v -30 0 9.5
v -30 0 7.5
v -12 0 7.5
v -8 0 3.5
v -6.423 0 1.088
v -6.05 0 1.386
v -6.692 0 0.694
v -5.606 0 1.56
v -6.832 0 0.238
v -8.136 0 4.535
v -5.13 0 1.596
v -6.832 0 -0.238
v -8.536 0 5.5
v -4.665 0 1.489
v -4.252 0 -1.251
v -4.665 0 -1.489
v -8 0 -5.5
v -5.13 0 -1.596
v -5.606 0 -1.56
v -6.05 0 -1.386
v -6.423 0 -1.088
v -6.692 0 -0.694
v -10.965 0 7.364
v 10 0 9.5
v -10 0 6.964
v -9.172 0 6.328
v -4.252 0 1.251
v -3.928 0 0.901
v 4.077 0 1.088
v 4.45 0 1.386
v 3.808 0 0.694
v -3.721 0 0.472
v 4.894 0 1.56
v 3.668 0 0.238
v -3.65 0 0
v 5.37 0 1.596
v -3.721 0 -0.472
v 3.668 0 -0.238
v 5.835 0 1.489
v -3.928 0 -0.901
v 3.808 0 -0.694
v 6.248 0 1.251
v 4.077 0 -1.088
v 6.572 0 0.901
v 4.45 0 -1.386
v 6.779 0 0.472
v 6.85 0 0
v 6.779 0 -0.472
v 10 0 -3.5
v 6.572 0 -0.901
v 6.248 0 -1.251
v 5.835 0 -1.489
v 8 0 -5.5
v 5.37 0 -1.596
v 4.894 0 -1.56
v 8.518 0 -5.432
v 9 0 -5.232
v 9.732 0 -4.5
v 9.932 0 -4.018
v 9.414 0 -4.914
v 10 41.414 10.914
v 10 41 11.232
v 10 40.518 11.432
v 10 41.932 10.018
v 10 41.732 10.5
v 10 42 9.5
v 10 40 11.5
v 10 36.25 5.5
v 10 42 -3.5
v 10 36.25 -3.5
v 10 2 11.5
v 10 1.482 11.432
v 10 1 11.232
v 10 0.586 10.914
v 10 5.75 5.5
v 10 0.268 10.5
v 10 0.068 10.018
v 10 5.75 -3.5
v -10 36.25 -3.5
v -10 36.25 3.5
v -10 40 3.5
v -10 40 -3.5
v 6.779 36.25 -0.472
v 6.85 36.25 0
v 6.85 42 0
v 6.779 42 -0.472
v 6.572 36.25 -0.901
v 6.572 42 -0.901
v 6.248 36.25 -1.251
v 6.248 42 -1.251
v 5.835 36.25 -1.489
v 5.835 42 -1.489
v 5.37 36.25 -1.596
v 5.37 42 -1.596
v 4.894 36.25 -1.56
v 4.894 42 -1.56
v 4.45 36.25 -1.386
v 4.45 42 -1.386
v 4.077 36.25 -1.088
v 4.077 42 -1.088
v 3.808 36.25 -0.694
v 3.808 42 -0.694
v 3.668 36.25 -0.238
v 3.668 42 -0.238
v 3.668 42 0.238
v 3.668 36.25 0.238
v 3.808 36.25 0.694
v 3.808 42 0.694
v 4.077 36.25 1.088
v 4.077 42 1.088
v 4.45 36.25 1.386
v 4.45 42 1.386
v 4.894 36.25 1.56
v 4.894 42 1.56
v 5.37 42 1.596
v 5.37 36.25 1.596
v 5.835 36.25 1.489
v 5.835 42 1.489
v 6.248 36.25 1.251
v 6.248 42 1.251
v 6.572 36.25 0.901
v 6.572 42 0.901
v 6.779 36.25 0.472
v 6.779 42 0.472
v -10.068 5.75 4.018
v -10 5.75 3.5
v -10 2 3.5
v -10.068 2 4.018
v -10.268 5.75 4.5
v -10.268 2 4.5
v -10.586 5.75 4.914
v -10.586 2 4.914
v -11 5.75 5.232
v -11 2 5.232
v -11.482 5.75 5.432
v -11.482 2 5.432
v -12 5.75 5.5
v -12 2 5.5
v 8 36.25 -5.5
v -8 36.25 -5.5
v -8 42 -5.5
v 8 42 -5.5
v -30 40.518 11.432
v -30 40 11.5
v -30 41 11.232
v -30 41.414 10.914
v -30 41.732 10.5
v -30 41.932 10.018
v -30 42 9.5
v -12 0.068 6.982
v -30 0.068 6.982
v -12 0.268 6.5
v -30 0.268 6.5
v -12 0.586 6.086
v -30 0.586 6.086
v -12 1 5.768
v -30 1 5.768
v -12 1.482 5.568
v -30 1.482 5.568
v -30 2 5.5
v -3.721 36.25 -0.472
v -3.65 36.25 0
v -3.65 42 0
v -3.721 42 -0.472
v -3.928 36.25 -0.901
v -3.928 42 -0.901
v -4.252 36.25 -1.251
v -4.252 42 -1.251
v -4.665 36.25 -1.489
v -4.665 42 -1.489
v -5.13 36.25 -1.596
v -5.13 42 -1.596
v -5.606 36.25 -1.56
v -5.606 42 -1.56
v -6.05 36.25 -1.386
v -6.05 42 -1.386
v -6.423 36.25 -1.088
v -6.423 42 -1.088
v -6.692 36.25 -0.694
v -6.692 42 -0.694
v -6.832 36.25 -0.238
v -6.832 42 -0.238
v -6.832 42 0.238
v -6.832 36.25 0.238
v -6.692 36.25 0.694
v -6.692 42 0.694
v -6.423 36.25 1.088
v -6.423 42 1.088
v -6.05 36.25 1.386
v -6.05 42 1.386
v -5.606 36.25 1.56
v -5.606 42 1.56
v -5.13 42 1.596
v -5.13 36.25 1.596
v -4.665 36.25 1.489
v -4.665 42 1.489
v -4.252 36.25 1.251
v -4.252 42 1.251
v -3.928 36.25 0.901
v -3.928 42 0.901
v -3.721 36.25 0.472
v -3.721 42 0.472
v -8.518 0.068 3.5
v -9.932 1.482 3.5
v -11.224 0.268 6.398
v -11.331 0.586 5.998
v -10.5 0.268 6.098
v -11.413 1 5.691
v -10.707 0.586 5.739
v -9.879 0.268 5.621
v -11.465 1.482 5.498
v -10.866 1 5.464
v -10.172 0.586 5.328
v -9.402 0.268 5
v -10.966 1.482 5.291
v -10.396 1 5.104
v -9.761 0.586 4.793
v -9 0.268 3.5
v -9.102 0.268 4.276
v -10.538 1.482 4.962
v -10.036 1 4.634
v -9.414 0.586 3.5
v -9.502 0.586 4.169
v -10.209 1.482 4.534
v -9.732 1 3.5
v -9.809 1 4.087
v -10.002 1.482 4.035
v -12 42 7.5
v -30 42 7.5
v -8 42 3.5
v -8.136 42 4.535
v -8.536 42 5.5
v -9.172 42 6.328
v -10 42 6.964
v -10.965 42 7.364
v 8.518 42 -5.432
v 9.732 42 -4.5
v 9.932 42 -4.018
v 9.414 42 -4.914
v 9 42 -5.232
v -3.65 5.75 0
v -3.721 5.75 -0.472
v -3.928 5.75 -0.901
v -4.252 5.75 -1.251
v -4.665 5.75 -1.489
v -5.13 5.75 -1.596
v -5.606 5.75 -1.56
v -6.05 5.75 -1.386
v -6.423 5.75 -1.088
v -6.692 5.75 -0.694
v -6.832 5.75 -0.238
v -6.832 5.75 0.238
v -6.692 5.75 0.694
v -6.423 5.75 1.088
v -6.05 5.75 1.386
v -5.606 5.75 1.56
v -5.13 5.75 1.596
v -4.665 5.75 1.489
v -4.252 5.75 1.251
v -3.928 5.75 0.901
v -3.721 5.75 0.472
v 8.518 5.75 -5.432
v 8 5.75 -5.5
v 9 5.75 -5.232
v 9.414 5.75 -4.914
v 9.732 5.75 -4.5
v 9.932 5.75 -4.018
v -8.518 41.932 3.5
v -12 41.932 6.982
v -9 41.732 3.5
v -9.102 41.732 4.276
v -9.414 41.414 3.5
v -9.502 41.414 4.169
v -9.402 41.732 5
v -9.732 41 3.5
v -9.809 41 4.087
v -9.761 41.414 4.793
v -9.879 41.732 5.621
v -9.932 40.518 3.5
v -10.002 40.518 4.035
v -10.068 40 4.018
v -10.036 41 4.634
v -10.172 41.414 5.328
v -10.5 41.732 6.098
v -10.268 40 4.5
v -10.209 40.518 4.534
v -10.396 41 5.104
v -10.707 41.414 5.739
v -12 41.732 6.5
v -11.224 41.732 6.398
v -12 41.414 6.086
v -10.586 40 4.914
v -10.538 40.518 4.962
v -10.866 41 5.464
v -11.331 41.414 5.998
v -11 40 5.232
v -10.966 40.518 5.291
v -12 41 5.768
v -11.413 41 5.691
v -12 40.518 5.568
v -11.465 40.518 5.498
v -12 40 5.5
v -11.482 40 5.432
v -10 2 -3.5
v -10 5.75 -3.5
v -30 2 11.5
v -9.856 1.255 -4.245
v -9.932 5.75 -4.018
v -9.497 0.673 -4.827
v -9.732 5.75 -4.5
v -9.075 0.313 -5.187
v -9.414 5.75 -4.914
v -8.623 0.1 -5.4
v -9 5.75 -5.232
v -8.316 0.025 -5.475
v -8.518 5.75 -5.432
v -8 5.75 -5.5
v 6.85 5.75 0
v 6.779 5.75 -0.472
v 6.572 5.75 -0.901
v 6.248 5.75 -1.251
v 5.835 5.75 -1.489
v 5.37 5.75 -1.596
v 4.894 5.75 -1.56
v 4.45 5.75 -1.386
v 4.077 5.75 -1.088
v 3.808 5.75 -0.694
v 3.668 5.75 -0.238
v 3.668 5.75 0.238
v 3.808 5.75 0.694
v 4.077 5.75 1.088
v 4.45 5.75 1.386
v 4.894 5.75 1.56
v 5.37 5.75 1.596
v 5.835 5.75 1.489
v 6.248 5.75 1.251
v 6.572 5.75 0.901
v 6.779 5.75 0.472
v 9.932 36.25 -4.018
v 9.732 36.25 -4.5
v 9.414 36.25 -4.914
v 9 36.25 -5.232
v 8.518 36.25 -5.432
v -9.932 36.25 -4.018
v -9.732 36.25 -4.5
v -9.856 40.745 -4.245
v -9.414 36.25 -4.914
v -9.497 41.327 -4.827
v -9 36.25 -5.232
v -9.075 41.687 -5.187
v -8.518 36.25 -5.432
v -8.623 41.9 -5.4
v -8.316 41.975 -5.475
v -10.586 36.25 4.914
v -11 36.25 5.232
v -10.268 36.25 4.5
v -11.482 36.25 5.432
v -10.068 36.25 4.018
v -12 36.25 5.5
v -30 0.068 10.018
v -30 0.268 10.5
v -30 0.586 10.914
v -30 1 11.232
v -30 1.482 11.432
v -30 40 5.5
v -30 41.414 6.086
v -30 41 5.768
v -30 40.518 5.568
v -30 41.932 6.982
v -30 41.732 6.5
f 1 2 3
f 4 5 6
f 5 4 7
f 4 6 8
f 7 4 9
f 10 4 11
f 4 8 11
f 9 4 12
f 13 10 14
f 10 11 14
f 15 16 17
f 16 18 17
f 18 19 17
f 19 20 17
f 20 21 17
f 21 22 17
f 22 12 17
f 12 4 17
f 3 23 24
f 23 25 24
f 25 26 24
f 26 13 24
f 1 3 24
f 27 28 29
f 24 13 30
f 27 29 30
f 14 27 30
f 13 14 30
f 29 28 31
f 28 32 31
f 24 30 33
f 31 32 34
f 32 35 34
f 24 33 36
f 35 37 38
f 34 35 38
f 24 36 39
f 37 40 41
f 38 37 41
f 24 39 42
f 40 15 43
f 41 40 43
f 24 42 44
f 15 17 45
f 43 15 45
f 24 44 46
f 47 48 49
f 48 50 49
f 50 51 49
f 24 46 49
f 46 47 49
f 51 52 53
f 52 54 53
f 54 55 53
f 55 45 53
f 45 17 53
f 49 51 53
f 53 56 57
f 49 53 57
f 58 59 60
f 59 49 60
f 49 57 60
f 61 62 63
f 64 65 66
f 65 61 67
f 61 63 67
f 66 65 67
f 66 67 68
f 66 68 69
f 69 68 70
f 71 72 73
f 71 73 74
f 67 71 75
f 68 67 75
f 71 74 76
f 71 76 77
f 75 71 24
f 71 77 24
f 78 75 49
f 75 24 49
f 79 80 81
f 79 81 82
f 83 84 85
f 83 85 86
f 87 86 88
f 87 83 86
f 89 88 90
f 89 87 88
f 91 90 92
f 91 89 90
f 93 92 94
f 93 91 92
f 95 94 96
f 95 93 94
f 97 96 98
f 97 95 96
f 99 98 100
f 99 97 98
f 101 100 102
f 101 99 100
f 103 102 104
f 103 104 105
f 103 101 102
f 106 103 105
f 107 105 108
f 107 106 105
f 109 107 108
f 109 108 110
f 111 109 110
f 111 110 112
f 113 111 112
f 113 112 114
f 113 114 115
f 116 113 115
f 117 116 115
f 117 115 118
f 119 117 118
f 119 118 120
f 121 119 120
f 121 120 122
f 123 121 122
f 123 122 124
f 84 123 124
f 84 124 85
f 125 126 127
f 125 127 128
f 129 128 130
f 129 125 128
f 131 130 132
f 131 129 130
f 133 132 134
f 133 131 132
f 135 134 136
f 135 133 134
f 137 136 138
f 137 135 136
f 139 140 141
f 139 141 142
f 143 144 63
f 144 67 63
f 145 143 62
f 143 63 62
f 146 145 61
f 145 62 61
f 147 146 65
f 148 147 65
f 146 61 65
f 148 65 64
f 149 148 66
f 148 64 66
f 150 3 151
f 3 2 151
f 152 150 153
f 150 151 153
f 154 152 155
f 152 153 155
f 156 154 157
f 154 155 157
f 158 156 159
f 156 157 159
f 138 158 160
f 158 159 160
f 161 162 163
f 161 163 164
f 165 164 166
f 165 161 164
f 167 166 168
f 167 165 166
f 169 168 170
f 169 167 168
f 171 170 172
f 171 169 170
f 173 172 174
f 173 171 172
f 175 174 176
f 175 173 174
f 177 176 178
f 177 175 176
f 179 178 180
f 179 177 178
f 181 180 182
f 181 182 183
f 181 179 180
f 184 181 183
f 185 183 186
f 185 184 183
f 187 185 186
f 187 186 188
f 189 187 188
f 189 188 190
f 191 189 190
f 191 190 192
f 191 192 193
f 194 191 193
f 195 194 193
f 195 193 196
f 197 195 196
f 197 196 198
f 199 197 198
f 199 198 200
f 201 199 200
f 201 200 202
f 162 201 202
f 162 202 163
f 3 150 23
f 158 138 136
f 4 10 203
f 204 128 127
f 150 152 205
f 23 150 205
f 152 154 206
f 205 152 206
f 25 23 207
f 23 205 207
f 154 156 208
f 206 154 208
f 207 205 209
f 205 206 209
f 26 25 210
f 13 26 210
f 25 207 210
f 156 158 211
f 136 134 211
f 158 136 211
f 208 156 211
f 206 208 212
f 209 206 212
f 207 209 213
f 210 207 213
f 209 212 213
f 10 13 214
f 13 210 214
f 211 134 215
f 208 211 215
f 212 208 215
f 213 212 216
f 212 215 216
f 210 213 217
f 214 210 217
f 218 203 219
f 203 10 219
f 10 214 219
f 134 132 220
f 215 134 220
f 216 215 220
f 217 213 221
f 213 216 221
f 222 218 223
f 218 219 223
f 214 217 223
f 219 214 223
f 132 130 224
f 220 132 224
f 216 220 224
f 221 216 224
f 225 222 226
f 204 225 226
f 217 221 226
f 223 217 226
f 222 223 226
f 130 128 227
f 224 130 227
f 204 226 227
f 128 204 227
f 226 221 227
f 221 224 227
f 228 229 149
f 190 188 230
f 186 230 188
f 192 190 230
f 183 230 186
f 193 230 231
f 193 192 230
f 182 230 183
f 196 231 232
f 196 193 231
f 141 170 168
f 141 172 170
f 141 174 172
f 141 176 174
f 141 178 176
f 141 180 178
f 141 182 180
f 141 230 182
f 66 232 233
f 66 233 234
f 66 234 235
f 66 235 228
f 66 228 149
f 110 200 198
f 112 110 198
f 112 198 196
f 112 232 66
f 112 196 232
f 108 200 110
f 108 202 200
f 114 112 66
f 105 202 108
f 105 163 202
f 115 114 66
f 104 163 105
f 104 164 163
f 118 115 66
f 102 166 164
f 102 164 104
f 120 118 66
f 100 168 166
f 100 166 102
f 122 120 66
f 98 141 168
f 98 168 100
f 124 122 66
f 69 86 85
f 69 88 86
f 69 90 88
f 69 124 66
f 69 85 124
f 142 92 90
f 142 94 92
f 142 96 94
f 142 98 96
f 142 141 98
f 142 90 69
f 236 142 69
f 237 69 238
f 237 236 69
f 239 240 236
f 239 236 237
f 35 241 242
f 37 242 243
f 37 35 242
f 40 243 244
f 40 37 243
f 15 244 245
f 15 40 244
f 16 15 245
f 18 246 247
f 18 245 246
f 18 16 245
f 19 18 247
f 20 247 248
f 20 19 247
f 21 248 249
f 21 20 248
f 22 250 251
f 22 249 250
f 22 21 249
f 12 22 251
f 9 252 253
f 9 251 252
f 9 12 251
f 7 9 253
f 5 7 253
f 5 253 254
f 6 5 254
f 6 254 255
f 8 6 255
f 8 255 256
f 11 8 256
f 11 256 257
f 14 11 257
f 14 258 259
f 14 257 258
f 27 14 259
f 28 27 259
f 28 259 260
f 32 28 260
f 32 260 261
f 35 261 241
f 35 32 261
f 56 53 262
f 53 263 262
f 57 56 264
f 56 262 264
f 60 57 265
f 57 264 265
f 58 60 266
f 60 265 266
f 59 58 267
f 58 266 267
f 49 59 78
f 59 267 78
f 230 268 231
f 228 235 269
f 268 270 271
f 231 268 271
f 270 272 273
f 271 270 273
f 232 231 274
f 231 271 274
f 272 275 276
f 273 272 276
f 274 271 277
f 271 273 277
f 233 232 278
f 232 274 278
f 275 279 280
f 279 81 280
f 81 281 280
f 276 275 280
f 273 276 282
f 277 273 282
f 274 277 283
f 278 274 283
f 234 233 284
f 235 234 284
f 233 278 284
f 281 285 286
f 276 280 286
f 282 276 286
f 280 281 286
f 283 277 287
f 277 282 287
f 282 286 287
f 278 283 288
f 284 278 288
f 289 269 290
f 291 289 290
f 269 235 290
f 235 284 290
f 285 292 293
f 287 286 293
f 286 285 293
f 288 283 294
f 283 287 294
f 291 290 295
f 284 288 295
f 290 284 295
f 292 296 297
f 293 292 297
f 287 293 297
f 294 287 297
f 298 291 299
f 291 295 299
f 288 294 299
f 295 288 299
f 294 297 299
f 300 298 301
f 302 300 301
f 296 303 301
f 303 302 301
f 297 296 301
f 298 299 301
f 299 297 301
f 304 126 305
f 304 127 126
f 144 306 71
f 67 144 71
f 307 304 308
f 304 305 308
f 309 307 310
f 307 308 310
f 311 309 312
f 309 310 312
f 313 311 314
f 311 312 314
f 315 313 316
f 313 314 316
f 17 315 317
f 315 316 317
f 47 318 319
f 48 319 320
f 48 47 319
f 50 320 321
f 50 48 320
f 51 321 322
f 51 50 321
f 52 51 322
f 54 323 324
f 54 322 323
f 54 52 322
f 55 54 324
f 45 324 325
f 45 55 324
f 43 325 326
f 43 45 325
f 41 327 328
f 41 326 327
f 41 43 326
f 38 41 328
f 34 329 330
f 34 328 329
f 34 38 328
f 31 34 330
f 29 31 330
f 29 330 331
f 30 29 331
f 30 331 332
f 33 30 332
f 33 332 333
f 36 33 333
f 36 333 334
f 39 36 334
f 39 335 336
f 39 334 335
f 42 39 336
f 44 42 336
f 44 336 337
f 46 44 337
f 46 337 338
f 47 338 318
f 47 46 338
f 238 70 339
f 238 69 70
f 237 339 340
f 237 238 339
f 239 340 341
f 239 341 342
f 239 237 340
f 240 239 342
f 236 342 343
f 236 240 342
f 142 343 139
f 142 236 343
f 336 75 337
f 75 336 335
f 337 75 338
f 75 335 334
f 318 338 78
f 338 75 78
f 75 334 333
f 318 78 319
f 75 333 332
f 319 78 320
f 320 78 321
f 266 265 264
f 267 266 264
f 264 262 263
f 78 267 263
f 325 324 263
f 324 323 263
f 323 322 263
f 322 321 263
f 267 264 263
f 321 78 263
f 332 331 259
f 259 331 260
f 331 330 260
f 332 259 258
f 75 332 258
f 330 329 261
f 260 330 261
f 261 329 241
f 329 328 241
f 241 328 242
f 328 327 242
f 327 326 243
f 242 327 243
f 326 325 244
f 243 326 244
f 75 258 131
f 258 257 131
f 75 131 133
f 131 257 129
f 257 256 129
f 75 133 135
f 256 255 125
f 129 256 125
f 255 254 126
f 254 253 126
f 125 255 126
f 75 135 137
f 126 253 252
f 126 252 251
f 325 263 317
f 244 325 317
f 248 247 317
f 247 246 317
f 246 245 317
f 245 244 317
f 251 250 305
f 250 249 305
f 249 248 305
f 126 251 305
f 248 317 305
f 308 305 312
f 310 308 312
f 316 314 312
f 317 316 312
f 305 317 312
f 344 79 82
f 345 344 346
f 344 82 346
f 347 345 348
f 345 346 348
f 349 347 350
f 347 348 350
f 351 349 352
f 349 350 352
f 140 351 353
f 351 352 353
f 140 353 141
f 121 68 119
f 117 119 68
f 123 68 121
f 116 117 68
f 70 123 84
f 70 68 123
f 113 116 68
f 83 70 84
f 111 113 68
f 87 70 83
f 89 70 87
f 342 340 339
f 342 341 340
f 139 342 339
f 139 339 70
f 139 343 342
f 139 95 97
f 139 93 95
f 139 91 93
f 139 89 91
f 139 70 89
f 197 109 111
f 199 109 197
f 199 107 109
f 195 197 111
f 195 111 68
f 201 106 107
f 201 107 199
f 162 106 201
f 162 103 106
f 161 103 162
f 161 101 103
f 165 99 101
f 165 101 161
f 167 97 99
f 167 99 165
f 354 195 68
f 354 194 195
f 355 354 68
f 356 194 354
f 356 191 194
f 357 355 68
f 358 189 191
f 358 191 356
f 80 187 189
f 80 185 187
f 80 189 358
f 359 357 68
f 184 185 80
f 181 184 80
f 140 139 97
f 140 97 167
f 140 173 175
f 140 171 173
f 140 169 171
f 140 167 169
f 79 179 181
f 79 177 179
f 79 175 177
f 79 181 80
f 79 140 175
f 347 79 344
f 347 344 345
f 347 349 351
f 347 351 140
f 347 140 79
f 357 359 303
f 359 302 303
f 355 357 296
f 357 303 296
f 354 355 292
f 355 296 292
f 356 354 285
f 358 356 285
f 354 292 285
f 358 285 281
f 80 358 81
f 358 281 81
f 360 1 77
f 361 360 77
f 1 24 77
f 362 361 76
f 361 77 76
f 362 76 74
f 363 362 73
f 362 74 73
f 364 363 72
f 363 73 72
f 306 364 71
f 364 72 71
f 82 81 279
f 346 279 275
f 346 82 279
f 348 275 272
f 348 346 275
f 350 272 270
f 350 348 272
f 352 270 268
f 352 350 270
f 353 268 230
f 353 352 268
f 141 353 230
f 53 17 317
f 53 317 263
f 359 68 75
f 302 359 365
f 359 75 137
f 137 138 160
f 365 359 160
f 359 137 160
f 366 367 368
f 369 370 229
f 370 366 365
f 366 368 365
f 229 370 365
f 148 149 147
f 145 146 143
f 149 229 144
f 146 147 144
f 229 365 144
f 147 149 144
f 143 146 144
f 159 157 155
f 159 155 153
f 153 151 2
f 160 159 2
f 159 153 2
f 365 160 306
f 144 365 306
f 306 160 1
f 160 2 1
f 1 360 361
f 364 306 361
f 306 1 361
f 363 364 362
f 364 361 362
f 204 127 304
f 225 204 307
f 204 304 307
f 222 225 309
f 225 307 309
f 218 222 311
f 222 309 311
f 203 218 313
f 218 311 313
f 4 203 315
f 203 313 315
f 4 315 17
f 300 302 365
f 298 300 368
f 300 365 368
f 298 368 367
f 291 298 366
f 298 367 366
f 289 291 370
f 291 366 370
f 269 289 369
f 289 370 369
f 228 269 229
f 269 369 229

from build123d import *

# Parameters (mm, degrees)
SKETCH1_W           = 20
SKETCH1_H           = 11
SKETCH1_R           = 1.6
BOSS_EXTRUDE1_DEPTH = 42
SKETCH2_W           = 20
SKETCH2_H           = 30.5
CUT_EXTRUDE1_DEPTH  = 11
FILLET1_R           = 2


with BuildPart() as part:
    # Sketch1 → Boss-Extrude1 (new body)
    with BuildSketch(Plane(origin=(0, 0, 0), x_dir=(1, 0, 0), z_dir=(0, 1, 0))):
        Rectangle(SKETCH1_W, SKETCH1_H)
        with Locations((5.25, 0)):
            Circle(SKETCH1_R, mode=Mode.SUBTRACT)
        with Locations((-5.25, 0)):
            Circle(SKETCH1_R, mode=Mode.SUBTRACT)
        Polygon((10, -5.5), (-10, -5.5), (-30, -5.5), (-30, -11.5), (10, -11.5), align=None)
    extrude(amount=BOSS_EXTRUDE1_DEPTH)

    # Sketch2 → Cut-Extrude1 (cut)
    with BuildSketch(Plane(origin=(0, 0, -5.5), x_dir=(-1, 0, 0), z_dir=(0, 0, -1))):
        with Locations((0, 21)):
            Rectangle(SKETCH2_W, SKETCH2_H)
    extrude(amount=-CUT_EXTRUDE1_DEPTH, mode=Mode.SUBTRACT)

    # Fillet1
    fillet1_edges = [part.edges().sort_by_distance(p)[0] for p in [
        (-10, 0, 11.5),
        (-20, 0, 5.5),
        (-10, 0, 0),
        (-10, 39.125, 5.5),
        (-10, 39.125, -5.5),
        (10, 39.125, -5.5),
        (-10, 42, 0),
        (-10, 2.875, 5.5),
        (-10, 2.875, -5.5),
        (10, 2.875, -5.5),
        (-20, 42, 5.5),
        (-10, 42, 11.5),
    ]]
    fillet(fillet1_edges, radius=FILLET1_R)


solid = part.part
